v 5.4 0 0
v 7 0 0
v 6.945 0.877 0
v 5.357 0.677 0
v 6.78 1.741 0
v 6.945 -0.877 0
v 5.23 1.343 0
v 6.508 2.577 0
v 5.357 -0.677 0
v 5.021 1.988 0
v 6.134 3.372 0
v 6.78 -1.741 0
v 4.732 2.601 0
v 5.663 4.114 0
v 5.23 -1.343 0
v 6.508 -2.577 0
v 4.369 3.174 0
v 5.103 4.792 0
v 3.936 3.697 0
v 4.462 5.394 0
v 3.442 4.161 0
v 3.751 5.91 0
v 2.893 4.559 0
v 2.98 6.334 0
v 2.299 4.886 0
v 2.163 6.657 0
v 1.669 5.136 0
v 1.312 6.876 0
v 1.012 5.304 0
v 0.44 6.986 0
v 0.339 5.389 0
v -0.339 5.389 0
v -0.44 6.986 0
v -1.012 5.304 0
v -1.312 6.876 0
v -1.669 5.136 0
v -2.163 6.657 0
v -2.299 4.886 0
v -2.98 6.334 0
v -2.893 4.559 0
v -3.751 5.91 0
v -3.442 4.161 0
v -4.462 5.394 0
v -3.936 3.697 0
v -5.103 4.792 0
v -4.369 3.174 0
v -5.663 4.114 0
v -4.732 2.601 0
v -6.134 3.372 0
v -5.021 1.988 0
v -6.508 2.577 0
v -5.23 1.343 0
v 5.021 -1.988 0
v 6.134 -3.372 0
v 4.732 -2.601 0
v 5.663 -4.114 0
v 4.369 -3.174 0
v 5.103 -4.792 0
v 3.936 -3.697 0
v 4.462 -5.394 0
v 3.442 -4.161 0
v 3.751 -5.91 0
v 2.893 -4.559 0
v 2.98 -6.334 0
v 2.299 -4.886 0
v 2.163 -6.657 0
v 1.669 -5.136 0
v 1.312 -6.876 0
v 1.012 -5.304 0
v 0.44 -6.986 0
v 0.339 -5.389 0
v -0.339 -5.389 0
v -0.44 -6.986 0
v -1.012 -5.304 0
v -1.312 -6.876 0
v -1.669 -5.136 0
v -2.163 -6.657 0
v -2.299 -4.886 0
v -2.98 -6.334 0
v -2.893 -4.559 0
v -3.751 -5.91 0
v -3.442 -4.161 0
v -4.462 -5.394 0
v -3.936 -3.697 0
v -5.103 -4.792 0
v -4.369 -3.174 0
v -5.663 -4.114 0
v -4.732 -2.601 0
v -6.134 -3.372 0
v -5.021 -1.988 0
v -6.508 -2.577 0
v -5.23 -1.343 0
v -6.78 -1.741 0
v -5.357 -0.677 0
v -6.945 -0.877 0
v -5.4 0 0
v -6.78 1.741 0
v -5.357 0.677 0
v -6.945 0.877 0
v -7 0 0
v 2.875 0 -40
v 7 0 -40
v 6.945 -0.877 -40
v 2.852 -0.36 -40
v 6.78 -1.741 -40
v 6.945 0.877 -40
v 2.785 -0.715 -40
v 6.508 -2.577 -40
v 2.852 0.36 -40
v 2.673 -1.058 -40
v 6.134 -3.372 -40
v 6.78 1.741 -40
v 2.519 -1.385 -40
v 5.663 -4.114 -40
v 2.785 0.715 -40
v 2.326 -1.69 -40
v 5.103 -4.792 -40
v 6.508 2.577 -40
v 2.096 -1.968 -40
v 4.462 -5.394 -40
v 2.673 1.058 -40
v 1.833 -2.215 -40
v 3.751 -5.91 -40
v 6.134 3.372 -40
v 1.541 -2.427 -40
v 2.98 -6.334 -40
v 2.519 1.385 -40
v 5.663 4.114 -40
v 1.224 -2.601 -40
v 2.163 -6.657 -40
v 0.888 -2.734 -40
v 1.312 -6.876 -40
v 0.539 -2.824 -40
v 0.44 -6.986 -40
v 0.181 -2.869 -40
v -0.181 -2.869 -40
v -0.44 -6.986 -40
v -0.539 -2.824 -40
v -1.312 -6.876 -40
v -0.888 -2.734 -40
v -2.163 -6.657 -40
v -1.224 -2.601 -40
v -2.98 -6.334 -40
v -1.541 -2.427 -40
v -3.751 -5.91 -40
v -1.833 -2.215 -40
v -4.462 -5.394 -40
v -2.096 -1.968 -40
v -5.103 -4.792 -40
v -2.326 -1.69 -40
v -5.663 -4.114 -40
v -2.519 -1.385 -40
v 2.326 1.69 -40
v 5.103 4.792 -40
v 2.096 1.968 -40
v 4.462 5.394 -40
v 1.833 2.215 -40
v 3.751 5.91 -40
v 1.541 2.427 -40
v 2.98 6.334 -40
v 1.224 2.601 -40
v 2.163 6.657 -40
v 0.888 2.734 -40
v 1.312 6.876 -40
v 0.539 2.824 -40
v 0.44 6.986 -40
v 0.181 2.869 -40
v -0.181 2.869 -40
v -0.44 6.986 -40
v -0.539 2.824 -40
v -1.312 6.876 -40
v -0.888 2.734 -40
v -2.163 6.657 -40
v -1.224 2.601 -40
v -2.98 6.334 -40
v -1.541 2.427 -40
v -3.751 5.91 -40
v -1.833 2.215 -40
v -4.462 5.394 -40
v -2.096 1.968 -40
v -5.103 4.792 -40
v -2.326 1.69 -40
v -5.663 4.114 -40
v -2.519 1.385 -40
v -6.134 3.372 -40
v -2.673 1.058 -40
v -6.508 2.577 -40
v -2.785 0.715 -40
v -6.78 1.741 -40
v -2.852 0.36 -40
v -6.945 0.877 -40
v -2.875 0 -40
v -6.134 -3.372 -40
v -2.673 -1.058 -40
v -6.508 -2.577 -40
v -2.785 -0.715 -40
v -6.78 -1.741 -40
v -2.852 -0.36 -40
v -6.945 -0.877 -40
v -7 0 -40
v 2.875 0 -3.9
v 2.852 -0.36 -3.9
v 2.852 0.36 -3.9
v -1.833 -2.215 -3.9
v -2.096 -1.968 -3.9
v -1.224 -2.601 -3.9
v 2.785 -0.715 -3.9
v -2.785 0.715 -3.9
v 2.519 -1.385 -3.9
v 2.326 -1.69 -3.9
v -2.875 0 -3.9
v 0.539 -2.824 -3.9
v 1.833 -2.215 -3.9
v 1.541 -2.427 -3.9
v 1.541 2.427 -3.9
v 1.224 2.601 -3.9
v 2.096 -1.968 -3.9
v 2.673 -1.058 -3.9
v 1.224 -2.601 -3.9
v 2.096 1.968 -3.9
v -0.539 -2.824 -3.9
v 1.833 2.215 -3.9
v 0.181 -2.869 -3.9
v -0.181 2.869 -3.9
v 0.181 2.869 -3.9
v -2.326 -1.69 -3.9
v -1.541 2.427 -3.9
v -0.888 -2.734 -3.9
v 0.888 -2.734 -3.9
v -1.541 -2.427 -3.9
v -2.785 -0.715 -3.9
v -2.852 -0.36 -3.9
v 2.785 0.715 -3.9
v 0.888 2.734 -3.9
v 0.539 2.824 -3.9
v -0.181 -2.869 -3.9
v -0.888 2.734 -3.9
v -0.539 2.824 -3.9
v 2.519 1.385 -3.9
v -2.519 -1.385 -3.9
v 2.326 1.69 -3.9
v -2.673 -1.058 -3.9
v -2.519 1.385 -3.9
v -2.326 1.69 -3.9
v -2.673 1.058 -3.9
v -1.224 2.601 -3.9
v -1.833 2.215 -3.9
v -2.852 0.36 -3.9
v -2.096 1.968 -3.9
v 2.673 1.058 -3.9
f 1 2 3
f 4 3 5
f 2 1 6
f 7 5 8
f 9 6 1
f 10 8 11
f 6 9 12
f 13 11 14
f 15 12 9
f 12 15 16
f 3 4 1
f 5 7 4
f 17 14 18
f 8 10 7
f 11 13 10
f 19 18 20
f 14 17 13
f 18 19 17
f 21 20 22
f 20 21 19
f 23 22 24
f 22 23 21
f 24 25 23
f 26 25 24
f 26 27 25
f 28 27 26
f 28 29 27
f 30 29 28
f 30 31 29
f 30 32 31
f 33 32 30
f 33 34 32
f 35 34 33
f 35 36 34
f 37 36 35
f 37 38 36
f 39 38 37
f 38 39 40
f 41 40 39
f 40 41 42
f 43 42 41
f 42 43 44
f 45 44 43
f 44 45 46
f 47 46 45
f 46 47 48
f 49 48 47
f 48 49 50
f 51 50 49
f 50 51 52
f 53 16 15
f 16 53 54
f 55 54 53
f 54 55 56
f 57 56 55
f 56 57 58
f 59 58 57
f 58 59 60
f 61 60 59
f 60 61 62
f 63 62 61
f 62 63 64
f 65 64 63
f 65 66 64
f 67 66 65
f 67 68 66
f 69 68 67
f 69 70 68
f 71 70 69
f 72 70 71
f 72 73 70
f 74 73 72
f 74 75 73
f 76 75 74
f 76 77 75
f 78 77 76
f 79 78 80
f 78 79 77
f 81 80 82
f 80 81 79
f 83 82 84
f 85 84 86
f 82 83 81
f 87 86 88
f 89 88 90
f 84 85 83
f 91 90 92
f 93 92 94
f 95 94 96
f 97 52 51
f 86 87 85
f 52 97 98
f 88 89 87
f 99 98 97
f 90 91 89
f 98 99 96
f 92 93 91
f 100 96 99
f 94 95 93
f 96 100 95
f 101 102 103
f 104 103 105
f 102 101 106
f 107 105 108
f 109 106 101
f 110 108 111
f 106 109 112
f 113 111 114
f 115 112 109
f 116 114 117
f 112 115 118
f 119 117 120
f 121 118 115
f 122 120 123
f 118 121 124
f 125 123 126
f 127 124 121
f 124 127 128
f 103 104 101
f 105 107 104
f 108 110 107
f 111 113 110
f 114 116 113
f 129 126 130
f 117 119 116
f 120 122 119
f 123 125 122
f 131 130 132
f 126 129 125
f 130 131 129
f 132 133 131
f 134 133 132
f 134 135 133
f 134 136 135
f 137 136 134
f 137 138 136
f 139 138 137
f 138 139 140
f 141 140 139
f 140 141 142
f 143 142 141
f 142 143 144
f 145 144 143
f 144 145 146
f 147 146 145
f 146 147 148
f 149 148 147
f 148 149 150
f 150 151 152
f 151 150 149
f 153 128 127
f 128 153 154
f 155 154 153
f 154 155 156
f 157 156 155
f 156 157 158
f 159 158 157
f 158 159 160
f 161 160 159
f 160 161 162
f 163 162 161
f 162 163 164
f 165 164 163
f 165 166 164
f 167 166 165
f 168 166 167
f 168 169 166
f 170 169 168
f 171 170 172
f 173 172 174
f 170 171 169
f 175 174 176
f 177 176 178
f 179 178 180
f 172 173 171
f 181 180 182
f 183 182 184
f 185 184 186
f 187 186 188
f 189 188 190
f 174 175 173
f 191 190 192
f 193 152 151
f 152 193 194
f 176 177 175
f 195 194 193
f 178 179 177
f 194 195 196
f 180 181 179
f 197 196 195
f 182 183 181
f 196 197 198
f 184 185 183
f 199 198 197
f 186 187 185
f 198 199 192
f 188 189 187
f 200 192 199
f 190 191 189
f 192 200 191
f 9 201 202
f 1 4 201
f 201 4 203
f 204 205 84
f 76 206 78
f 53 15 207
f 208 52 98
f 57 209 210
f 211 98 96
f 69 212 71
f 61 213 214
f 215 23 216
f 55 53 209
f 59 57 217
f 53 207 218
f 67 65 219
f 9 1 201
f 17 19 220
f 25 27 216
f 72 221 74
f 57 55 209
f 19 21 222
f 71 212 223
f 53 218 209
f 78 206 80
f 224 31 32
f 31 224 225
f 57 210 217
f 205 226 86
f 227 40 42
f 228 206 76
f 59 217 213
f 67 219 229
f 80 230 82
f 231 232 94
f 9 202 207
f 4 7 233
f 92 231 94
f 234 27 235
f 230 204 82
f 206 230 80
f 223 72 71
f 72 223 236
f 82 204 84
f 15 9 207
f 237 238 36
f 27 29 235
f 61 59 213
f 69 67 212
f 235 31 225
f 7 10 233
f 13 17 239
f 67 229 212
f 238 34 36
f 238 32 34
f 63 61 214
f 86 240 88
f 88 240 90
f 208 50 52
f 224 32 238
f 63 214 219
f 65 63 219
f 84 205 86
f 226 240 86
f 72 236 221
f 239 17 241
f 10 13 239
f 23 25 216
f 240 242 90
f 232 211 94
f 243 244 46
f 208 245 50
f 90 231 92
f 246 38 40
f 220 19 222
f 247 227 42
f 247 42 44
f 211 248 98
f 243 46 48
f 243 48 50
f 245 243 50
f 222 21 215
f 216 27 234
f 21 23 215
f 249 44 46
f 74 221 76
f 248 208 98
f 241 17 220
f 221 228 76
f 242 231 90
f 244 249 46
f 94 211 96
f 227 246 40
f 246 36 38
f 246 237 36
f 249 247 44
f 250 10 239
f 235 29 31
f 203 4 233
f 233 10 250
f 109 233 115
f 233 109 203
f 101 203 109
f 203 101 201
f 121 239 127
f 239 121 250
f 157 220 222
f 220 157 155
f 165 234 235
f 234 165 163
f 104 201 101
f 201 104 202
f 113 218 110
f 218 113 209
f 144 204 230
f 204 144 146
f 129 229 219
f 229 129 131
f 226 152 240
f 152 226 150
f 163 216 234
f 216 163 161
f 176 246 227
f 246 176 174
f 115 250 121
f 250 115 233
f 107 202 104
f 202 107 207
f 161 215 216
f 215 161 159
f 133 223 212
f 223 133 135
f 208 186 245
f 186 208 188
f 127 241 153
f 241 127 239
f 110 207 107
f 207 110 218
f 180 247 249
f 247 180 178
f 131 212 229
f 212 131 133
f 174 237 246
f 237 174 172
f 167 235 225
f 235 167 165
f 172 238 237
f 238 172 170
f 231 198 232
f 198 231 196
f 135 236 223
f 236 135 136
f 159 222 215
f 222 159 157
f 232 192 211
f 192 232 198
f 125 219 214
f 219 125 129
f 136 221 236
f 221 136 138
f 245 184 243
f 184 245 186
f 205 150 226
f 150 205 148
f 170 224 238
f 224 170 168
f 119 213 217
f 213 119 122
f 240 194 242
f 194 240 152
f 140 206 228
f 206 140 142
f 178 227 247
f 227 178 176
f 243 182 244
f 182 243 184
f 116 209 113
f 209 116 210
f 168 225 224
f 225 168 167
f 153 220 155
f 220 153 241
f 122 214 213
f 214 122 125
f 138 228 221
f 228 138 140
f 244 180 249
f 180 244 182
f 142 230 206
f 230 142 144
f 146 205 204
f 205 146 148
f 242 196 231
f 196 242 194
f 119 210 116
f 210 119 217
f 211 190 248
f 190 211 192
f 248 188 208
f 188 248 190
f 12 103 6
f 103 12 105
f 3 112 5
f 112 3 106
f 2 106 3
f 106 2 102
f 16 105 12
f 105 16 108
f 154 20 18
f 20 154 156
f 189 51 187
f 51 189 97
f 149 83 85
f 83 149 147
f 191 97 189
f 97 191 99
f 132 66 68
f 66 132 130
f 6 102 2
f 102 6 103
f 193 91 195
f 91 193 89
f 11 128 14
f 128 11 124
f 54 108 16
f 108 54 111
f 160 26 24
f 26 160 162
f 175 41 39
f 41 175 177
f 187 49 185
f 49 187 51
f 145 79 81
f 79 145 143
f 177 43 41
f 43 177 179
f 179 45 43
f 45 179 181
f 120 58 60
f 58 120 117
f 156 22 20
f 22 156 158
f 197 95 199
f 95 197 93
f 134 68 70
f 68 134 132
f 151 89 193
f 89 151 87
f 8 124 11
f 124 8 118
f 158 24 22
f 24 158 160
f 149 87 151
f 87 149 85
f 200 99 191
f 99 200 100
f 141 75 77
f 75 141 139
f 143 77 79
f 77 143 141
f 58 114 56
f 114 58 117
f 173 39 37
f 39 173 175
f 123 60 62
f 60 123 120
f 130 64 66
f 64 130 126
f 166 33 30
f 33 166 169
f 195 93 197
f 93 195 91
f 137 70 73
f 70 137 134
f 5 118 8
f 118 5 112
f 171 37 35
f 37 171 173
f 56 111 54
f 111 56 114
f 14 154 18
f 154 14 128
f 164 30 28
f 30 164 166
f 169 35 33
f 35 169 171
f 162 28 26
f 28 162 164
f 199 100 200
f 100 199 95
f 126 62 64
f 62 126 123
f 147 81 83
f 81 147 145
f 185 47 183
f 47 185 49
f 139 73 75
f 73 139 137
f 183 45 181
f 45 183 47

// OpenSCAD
$fn = 50;


difference() {
	union() {
		translate(v = [0, 0, -40.0000000000]) {
			cylinder(h = 40, r = 7.0000000000);
		}
		cylinder(h = 0, r = 10.0000000000);
	}
	union() {
		translate(v = [0, 0, 0]) {
			rotate(a = [0, 0, 0]) {
				difference() {
					union() {
						#translate(v = [0, 0, -40.0000000000]) {
							cylinder(h = 40, r = 2.6000000000);
						}
						#translate(v = [0, 0, -3.9000000000]) {
							cylinder(h = 3.9000000000, r = 7.0000000000, r1 = 2.8750000000, r2 = 5.4000000000);
						}
						#translate(v = [0, 0, -40.0000000000]) {
							cylinder(h = 40, r = 2.8750000000);
						}
						#translate(v = [0, 0, -40.0000000000]) {
							cylinder(h = 40, r = 2.6000000000);
						}
					}
					union();
				}
			}
		}
	}
}
